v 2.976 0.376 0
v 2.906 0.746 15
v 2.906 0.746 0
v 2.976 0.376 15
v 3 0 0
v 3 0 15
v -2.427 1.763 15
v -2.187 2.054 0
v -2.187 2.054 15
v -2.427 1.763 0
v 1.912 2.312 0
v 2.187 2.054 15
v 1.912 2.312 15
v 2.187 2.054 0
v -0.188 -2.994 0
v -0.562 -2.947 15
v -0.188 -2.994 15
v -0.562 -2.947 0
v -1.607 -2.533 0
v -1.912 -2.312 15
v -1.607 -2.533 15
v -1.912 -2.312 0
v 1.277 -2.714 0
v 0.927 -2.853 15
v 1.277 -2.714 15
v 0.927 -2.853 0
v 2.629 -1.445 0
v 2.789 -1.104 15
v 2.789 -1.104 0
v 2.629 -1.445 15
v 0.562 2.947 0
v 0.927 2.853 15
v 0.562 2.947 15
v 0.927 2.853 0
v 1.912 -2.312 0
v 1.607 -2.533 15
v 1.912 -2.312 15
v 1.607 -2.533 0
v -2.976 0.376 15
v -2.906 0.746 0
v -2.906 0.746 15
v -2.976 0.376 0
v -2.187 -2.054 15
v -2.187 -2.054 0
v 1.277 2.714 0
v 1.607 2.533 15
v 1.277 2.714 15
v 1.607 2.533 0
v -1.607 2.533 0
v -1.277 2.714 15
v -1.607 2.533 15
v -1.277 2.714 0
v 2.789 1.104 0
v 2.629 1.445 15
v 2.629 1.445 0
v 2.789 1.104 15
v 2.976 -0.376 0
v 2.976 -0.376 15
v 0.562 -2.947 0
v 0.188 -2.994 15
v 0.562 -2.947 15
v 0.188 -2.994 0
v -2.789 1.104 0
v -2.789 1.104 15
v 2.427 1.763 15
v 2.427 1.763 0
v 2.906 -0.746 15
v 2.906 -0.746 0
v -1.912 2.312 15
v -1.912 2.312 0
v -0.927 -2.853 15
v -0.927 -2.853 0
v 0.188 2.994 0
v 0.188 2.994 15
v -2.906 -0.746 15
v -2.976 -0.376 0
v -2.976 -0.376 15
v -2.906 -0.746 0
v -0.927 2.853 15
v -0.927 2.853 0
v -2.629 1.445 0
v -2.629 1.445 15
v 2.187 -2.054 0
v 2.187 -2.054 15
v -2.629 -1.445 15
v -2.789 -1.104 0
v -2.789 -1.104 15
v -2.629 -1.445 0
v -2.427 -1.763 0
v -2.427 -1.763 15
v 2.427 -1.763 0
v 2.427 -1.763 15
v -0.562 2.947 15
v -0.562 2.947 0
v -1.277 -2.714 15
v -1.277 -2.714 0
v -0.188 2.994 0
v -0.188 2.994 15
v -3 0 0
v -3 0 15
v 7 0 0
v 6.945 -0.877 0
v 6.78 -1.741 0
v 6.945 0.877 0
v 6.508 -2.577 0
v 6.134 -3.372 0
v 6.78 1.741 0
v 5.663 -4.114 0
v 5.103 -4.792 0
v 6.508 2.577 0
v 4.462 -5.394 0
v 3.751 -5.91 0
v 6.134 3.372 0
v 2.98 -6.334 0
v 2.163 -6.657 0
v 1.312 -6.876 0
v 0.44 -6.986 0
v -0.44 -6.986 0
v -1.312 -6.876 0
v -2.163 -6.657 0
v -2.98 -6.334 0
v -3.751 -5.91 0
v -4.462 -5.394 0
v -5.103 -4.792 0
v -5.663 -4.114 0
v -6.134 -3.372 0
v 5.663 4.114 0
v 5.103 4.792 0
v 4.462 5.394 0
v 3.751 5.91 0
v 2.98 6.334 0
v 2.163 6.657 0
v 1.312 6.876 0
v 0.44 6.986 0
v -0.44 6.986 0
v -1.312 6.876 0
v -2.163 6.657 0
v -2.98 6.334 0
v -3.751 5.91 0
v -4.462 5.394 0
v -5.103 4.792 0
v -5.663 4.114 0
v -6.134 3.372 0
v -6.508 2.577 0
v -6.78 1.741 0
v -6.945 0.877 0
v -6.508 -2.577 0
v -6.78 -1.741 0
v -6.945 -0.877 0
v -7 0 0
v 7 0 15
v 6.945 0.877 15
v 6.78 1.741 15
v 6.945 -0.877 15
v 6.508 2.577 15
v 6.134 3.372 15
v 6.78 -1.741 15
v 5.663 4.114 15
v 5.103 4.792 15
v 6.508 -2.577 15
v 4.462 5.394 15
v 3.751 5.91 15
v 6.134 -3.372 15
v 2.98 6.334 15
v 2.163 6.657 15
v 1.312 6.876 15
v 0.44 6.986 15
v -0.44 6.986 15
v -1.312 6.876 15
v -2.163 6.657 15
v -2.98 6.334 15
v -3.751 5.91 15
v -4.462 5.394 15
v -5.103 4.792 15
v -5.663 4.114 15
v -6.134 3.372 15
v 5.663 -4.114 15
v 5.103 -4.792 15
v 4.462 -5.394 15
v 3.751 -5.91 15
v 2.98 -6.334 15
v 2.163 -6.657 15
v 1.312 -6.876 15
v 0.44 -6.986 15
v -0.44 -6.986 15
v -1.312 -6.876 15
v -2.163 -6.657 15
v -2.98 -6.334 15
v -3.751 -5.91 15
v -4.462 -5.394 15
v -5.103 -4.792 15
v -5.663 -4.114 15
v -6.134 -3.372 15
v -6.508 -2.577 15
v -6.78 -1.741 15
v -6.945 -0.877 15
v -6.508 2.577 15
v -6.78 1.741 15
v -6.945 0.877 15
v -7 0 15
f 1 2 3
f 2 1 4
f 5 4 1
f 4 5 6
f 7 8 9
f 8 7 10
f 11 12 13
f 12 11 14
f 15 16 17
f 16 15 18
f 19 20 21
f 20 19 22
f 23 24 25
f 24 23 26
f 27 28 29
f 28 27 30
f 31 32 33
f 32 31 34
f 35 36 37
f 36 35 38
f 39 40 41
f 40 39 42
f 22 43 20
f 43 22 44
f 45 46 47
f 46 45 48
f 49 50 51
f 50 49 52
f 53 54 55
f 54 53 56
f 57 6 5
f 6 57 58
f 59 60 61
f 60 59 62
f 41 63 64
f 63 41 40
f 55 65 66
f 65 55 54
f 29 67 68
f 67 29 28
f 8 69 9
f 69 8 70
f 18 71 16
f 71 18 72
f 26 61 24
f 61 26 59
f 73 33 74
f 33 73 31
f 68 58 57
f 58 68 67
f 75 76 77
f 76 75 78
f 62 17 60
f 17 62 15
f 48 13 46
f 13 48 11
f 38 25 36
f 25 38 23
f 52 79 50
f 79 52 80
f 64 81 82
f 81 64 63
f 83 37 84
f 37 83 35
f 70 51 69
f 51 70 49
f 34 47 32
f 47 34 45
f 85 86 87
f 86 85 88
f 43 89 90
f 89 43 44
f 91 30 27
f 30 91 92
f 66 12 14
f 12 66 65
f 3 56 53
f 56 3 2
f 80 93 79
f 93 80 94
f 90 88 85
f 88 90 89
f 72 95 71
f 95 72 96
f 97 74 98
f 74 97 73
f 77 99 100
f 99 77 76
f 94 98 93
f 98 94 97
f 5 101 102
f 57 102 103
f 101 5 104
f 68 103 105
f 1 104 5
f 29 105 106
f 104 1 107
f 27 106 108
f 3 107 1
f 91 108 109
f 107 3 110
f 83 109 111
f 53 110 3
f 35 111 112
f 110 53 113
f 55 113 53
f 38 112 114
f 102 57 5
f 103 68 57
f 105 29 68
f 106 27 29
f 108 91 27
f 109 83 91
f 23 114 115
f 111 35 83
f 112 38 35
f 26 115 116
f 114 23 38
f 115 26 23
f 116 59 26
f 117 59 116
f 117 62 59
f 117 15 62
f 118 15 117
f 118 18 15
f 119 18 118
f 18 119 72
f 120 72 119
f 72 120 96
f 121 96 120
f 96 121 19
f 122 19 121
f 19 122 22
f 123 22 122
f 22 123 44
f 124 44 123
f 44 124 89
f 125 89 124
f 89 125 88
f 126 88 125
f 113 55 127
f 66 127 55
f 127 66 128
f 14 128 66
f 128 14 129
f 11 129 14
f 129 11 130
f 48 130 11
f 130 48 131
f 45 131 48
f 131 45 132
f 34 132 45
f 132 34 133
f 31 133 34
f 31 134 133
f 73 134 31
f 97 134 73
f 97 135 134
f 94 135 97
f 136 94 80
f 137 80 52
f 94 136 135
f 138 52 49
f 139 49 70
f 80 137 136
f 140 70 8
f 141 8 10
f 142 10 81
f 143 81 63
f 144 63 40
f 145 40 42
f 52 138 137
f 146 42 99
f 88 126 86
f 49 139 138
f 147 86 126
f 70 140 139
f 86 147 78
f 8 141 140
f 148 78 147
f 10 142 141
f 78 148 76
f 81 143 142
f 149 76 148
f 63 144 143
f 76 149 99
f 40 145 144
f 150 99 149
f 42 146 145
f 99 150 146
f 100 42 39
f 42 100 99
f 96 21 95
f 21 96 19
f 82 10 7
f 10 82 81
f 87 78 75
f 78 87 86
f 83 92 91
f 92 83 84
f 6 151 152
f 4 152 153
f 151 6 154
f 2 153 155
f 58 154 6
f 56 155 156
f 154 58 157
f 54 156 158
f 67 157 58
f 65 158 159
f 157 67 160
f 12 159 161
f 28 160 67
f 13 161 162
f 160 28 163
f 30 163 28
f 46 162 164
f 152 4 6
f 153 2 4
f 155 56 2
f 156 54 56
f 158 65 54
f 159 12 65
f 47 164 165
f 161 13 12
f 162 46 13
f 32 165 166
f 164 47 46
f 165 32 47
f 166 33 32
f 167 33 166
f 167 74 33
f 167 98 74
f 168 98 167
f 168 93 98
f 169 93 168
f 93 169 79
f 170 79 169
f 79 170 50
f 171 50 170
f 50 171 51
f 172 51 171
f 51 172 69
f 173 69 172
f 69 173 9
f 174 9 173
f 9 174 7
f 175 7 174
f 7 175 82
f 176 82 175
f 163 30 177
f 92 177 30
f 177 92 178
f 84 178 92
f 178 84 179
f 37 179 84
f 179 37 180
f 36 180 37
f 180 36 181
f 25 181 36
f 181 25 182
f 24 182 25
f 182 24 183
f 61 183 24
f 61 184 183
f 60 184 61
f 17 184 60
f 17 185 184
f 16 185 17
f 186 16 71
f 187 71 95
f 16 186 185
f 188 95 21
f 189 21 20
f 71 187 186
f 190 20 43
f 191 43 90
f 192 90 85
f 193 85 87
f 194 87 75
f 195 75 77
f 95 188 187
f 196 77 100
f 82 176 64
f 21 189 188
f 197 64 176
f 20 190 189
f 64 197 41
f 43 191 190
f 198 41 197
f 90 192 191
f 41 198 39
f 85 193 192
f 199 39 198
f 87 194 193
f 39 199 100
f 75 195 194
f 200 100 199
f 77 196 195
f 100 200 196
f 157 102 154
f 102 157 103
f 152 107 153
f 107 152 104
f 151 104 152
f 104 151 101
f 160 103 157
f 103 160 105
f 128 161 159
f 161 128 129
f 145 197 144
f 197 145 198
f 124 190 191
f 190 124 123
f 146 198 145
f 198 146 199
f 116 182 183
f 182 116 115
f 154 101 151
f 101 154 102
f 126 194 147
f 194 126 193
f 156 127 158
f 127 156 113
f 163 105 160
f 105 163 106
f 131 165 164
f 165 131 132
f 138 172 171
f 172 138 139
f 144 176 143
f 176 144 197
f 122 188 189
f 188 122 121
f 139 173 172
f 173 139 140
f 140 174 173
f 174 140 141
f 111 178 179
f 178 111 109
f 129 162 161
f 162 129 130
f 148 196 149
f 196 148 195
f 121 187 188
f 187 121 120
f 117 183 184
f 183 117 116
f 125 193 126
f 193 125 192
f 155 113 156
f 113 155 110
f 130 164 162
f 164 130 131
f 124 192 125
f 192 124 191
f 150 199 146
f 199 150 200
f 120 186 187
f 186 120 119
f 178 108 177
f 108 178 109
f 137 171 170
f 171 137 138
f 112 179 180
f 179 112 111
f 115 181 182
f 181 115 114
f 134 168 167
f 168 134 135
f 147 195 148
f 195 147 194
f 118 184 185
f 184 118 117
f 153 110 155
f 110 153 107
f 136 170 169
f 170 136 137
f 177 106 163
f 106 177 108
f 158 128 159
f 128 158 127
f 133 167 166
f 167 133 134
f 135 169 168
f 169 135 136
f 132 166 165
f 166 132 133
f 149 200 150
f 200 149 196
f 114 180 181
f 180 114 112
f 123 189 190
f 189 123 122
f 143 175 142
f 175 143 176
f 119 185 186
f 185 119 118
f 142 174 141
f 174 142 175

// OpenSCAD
$fn = 50;

difference() {
	union() {
		cylinder(h = 15, r = 7.0);
	}
	union() {
		cylinder(h = 15, r = 3.0);
		cylinder(h = 15, r = 1.5);
	}
}
